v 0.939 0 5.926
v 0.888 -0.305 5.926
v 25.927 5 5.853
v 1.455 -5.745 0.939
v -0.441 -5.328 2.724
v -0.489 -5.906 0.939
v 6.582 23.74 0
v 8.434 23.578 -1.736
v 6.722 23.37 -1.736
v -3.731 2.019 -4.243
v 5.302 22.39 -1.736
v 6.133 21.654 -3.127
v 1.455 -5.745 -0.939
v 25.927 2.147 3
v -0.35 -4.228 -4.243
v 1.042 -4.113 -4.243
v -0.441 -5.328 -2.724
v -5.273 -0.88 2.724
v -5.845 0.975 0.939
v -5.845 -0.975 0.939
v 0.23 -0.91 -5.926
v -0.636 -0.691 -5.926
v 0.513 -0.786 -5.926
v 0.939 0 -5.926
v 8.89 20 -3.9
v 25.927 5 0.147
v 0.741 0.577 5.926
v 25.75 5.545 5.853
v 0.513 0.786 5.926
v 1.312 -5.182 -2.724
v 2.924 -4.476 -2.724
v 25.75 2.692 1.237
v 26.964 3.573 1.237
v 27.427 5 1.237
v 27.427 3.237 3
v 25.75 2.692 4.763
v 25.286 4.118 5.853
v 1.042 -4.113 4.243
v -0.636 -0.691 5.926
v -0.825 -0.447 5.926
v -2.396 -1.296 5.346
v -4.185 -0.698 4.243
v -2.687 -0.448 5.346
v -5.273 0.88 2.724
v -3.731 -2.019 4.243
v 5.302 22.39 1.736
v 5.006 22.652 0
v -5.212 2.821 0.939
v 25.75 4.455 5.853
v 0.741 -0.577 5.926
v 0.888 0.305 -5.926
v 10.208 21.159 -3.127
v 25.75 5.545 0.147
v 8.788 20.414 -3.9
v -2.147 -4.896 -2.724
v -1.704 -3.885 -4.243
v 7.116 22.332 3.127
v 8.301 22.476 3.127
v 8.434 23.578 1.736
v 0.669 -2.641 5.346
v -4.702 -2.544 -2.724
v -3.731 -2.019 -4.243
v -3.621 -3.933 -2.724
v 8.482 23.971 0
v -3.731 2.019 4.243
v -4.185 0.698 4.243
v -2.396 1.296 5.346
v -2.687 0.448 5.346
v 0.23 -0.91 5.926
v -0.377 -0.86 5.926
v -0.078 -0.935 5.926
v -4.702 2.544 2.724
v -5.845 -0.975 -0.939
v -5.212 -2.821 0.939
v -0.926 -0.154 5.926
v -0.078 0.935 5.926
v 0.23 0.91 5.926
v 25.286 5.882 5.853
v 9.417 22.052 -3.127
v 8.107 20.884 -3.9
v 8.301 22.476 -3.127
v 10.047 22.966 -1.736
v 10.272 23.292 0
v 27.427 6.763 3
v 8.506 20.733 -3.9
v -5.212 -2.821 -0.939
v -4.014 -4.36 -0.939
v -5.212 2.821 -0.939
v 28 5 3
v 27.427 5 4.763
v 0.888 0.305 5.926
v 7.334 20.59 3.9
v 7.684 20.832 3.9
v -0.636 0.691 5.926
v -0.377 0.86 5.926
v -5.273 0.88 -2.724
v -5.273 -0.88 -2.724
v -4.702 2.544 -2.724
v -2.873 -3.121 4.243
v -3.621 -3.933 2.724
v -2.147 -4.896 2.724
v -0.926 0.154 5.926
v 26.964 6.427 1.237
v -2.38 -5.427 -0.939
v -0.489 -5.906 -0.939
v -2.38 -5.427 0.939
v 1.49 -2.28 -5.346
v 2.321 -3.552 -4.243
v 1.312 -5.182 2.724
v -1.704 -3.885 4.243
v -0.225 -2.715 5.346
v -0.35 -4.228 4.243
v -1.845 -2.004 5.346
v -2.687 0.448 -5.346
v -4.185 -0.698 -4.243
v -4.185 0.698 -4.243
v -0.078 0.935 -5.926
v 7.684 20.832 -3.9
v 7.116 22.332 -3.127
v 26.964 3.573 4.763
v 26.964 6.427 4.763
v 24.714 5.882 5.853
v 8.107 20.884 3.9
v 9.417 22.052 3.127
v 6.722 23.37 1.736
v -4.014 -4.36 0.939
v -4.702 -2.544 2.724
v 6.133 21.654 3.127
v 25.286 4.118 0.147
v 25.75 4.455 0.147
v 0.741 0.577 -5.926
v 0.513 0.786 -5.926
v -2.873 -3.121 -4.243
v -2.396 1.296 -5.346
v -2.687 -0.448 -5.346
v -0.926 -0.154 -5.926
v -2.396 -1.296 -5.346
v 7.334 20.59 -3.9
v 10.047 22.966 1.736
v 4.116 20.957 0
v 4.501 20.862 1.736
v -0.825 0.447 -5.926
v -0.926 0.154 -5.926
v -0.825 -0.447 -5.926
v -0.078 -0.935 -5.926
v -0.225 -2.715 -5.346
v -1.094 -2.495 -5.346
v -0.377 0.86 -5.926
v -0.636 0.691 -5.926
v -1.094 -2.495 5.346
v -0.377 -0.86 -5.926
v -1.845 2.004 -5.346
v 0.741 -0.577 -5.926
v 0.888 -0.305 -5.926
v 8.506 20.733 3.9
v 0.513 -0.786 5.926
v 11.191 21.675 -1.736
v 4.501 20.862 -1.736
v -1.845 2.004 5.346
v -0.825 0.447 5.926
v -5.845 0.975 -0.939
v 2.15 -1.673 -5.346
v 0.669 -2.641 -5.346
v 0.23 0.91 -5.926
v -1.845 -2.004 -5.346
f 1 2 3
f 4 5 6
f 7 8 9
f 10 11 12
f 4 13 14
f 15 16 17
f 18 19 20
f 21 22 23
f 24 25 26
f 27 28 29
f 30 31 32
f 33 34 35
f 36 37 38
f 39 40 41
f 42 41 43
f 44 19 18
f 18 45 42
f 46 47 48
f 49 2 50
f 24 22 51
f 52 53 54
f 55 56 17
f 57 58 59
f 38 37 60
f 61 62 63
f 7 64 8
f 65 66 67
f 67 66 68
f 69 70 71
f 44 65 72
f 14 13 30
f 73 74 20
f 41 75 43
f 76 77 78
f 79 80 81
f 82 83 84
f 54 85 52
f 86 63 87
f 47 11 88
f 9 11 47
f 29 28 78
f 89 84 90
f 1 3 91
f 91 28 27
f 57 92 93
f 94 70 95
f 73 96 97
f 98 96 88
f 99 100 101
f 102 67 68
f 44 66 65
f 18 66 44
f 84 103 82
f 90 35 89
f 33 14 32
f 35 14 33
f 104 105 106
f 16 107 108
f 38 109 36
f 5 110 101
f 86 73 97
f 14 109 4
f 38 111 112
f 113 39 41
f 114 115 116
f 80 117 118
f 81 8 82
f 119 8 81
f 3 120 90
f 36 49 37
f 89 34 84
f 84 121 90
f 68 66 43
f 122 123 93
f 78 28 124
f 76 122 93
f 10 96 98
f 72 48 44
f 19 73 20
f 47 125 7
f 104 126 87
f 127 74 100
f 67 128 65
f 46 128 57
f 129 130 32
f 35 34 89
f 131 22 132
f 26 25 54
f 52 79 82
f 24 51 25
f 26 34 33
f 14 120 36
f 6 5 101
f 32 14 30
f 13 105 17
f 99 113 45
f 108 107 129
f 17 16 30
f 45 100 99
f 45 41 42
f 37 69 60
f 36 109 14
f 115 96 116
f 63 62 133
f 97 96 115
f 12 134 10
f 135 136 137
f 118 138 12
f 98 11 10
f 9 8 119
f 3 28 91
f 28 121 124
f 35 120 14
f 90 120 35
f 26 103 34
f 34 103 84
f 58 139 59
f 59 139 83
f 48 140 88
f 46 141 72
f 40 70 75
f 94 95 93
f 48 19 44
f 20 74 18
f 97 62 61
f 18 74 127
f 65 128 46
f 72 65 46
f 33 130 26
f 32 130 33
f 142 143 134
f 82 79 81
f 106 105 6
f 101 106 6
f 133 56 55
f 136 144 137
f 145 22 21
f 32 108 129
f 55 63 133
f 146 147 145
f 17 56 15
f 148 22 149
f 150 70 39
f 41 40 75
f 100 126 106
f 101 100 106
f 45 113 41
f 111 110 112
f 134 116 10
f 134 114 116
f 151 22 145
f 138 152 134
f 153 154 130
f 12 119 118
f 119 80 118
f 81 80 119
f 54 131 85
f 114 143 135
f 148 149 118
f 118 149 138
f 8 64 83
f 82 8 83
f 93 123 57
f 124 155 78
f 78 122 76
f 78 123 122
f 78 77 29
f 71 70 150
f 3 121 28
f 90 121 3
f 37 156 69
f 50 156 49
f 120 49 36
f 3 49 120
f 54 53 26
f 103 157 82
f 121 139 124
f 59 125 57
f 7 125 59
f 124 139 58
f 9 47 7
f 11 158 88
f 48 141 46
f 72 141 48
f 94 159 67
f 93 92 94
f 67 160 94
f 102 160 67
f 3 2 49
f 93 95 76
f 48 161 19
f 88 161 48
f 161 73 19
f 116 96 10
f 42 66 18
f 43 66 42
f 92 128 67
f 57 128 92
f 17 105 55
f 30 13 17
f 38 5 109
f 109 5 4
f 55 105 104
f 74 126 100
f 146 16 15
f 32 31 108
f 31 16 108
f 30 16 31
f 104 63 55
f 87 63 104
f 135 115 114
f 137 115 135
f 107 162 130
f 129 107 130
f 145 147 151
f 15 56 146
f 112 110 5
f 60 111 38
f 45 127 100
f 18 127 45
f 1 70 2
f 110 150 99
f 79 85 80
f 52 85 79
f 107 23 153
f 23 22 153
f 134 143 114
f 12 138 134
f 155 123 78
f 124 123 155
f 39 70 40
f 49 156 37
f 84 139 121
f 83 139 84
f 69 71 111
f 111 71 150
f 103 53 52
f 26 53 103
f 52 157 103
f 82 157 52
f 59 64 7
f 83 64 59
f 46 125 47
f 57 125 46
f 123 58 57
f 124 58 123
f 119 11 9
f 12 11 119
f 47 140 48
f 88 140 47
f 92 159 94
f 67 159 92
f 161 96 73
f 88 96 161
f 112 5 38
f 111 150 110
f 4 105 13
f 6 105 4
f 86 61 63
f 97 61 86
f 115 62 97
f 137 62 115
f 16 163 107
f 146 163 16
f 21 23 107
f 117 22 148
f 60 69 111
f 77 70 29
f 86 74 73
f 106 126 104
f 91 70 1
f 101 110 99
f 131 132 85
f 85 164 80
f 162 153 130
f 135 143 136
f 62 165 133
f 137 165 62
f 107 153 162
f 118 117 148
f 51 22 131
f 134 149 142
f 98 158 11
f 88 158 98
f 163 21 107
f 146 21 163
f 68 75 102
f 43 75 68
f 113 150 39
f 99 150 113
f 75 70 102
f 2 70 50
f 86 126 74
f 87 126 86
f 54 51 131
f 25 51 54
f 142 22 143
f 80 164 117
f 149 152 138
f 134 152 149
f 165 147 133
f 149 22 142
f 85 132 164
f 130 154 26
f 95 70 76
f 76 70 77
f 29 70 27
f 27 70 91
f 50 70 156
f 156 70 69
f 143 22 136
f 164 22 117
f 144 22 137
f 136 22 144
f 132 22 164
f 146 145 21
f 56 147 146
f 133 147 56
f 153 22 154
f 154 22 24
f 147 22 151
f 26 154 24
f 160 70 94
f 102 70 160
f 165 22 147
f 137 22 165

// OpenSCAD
// case 04: three unequal balls — two planes, three cones, three sphere patches.
hull() { sphere(6); translate([25, 5, 3]) sphere(3); translate([8, 20, 0]) sphere(4); }
